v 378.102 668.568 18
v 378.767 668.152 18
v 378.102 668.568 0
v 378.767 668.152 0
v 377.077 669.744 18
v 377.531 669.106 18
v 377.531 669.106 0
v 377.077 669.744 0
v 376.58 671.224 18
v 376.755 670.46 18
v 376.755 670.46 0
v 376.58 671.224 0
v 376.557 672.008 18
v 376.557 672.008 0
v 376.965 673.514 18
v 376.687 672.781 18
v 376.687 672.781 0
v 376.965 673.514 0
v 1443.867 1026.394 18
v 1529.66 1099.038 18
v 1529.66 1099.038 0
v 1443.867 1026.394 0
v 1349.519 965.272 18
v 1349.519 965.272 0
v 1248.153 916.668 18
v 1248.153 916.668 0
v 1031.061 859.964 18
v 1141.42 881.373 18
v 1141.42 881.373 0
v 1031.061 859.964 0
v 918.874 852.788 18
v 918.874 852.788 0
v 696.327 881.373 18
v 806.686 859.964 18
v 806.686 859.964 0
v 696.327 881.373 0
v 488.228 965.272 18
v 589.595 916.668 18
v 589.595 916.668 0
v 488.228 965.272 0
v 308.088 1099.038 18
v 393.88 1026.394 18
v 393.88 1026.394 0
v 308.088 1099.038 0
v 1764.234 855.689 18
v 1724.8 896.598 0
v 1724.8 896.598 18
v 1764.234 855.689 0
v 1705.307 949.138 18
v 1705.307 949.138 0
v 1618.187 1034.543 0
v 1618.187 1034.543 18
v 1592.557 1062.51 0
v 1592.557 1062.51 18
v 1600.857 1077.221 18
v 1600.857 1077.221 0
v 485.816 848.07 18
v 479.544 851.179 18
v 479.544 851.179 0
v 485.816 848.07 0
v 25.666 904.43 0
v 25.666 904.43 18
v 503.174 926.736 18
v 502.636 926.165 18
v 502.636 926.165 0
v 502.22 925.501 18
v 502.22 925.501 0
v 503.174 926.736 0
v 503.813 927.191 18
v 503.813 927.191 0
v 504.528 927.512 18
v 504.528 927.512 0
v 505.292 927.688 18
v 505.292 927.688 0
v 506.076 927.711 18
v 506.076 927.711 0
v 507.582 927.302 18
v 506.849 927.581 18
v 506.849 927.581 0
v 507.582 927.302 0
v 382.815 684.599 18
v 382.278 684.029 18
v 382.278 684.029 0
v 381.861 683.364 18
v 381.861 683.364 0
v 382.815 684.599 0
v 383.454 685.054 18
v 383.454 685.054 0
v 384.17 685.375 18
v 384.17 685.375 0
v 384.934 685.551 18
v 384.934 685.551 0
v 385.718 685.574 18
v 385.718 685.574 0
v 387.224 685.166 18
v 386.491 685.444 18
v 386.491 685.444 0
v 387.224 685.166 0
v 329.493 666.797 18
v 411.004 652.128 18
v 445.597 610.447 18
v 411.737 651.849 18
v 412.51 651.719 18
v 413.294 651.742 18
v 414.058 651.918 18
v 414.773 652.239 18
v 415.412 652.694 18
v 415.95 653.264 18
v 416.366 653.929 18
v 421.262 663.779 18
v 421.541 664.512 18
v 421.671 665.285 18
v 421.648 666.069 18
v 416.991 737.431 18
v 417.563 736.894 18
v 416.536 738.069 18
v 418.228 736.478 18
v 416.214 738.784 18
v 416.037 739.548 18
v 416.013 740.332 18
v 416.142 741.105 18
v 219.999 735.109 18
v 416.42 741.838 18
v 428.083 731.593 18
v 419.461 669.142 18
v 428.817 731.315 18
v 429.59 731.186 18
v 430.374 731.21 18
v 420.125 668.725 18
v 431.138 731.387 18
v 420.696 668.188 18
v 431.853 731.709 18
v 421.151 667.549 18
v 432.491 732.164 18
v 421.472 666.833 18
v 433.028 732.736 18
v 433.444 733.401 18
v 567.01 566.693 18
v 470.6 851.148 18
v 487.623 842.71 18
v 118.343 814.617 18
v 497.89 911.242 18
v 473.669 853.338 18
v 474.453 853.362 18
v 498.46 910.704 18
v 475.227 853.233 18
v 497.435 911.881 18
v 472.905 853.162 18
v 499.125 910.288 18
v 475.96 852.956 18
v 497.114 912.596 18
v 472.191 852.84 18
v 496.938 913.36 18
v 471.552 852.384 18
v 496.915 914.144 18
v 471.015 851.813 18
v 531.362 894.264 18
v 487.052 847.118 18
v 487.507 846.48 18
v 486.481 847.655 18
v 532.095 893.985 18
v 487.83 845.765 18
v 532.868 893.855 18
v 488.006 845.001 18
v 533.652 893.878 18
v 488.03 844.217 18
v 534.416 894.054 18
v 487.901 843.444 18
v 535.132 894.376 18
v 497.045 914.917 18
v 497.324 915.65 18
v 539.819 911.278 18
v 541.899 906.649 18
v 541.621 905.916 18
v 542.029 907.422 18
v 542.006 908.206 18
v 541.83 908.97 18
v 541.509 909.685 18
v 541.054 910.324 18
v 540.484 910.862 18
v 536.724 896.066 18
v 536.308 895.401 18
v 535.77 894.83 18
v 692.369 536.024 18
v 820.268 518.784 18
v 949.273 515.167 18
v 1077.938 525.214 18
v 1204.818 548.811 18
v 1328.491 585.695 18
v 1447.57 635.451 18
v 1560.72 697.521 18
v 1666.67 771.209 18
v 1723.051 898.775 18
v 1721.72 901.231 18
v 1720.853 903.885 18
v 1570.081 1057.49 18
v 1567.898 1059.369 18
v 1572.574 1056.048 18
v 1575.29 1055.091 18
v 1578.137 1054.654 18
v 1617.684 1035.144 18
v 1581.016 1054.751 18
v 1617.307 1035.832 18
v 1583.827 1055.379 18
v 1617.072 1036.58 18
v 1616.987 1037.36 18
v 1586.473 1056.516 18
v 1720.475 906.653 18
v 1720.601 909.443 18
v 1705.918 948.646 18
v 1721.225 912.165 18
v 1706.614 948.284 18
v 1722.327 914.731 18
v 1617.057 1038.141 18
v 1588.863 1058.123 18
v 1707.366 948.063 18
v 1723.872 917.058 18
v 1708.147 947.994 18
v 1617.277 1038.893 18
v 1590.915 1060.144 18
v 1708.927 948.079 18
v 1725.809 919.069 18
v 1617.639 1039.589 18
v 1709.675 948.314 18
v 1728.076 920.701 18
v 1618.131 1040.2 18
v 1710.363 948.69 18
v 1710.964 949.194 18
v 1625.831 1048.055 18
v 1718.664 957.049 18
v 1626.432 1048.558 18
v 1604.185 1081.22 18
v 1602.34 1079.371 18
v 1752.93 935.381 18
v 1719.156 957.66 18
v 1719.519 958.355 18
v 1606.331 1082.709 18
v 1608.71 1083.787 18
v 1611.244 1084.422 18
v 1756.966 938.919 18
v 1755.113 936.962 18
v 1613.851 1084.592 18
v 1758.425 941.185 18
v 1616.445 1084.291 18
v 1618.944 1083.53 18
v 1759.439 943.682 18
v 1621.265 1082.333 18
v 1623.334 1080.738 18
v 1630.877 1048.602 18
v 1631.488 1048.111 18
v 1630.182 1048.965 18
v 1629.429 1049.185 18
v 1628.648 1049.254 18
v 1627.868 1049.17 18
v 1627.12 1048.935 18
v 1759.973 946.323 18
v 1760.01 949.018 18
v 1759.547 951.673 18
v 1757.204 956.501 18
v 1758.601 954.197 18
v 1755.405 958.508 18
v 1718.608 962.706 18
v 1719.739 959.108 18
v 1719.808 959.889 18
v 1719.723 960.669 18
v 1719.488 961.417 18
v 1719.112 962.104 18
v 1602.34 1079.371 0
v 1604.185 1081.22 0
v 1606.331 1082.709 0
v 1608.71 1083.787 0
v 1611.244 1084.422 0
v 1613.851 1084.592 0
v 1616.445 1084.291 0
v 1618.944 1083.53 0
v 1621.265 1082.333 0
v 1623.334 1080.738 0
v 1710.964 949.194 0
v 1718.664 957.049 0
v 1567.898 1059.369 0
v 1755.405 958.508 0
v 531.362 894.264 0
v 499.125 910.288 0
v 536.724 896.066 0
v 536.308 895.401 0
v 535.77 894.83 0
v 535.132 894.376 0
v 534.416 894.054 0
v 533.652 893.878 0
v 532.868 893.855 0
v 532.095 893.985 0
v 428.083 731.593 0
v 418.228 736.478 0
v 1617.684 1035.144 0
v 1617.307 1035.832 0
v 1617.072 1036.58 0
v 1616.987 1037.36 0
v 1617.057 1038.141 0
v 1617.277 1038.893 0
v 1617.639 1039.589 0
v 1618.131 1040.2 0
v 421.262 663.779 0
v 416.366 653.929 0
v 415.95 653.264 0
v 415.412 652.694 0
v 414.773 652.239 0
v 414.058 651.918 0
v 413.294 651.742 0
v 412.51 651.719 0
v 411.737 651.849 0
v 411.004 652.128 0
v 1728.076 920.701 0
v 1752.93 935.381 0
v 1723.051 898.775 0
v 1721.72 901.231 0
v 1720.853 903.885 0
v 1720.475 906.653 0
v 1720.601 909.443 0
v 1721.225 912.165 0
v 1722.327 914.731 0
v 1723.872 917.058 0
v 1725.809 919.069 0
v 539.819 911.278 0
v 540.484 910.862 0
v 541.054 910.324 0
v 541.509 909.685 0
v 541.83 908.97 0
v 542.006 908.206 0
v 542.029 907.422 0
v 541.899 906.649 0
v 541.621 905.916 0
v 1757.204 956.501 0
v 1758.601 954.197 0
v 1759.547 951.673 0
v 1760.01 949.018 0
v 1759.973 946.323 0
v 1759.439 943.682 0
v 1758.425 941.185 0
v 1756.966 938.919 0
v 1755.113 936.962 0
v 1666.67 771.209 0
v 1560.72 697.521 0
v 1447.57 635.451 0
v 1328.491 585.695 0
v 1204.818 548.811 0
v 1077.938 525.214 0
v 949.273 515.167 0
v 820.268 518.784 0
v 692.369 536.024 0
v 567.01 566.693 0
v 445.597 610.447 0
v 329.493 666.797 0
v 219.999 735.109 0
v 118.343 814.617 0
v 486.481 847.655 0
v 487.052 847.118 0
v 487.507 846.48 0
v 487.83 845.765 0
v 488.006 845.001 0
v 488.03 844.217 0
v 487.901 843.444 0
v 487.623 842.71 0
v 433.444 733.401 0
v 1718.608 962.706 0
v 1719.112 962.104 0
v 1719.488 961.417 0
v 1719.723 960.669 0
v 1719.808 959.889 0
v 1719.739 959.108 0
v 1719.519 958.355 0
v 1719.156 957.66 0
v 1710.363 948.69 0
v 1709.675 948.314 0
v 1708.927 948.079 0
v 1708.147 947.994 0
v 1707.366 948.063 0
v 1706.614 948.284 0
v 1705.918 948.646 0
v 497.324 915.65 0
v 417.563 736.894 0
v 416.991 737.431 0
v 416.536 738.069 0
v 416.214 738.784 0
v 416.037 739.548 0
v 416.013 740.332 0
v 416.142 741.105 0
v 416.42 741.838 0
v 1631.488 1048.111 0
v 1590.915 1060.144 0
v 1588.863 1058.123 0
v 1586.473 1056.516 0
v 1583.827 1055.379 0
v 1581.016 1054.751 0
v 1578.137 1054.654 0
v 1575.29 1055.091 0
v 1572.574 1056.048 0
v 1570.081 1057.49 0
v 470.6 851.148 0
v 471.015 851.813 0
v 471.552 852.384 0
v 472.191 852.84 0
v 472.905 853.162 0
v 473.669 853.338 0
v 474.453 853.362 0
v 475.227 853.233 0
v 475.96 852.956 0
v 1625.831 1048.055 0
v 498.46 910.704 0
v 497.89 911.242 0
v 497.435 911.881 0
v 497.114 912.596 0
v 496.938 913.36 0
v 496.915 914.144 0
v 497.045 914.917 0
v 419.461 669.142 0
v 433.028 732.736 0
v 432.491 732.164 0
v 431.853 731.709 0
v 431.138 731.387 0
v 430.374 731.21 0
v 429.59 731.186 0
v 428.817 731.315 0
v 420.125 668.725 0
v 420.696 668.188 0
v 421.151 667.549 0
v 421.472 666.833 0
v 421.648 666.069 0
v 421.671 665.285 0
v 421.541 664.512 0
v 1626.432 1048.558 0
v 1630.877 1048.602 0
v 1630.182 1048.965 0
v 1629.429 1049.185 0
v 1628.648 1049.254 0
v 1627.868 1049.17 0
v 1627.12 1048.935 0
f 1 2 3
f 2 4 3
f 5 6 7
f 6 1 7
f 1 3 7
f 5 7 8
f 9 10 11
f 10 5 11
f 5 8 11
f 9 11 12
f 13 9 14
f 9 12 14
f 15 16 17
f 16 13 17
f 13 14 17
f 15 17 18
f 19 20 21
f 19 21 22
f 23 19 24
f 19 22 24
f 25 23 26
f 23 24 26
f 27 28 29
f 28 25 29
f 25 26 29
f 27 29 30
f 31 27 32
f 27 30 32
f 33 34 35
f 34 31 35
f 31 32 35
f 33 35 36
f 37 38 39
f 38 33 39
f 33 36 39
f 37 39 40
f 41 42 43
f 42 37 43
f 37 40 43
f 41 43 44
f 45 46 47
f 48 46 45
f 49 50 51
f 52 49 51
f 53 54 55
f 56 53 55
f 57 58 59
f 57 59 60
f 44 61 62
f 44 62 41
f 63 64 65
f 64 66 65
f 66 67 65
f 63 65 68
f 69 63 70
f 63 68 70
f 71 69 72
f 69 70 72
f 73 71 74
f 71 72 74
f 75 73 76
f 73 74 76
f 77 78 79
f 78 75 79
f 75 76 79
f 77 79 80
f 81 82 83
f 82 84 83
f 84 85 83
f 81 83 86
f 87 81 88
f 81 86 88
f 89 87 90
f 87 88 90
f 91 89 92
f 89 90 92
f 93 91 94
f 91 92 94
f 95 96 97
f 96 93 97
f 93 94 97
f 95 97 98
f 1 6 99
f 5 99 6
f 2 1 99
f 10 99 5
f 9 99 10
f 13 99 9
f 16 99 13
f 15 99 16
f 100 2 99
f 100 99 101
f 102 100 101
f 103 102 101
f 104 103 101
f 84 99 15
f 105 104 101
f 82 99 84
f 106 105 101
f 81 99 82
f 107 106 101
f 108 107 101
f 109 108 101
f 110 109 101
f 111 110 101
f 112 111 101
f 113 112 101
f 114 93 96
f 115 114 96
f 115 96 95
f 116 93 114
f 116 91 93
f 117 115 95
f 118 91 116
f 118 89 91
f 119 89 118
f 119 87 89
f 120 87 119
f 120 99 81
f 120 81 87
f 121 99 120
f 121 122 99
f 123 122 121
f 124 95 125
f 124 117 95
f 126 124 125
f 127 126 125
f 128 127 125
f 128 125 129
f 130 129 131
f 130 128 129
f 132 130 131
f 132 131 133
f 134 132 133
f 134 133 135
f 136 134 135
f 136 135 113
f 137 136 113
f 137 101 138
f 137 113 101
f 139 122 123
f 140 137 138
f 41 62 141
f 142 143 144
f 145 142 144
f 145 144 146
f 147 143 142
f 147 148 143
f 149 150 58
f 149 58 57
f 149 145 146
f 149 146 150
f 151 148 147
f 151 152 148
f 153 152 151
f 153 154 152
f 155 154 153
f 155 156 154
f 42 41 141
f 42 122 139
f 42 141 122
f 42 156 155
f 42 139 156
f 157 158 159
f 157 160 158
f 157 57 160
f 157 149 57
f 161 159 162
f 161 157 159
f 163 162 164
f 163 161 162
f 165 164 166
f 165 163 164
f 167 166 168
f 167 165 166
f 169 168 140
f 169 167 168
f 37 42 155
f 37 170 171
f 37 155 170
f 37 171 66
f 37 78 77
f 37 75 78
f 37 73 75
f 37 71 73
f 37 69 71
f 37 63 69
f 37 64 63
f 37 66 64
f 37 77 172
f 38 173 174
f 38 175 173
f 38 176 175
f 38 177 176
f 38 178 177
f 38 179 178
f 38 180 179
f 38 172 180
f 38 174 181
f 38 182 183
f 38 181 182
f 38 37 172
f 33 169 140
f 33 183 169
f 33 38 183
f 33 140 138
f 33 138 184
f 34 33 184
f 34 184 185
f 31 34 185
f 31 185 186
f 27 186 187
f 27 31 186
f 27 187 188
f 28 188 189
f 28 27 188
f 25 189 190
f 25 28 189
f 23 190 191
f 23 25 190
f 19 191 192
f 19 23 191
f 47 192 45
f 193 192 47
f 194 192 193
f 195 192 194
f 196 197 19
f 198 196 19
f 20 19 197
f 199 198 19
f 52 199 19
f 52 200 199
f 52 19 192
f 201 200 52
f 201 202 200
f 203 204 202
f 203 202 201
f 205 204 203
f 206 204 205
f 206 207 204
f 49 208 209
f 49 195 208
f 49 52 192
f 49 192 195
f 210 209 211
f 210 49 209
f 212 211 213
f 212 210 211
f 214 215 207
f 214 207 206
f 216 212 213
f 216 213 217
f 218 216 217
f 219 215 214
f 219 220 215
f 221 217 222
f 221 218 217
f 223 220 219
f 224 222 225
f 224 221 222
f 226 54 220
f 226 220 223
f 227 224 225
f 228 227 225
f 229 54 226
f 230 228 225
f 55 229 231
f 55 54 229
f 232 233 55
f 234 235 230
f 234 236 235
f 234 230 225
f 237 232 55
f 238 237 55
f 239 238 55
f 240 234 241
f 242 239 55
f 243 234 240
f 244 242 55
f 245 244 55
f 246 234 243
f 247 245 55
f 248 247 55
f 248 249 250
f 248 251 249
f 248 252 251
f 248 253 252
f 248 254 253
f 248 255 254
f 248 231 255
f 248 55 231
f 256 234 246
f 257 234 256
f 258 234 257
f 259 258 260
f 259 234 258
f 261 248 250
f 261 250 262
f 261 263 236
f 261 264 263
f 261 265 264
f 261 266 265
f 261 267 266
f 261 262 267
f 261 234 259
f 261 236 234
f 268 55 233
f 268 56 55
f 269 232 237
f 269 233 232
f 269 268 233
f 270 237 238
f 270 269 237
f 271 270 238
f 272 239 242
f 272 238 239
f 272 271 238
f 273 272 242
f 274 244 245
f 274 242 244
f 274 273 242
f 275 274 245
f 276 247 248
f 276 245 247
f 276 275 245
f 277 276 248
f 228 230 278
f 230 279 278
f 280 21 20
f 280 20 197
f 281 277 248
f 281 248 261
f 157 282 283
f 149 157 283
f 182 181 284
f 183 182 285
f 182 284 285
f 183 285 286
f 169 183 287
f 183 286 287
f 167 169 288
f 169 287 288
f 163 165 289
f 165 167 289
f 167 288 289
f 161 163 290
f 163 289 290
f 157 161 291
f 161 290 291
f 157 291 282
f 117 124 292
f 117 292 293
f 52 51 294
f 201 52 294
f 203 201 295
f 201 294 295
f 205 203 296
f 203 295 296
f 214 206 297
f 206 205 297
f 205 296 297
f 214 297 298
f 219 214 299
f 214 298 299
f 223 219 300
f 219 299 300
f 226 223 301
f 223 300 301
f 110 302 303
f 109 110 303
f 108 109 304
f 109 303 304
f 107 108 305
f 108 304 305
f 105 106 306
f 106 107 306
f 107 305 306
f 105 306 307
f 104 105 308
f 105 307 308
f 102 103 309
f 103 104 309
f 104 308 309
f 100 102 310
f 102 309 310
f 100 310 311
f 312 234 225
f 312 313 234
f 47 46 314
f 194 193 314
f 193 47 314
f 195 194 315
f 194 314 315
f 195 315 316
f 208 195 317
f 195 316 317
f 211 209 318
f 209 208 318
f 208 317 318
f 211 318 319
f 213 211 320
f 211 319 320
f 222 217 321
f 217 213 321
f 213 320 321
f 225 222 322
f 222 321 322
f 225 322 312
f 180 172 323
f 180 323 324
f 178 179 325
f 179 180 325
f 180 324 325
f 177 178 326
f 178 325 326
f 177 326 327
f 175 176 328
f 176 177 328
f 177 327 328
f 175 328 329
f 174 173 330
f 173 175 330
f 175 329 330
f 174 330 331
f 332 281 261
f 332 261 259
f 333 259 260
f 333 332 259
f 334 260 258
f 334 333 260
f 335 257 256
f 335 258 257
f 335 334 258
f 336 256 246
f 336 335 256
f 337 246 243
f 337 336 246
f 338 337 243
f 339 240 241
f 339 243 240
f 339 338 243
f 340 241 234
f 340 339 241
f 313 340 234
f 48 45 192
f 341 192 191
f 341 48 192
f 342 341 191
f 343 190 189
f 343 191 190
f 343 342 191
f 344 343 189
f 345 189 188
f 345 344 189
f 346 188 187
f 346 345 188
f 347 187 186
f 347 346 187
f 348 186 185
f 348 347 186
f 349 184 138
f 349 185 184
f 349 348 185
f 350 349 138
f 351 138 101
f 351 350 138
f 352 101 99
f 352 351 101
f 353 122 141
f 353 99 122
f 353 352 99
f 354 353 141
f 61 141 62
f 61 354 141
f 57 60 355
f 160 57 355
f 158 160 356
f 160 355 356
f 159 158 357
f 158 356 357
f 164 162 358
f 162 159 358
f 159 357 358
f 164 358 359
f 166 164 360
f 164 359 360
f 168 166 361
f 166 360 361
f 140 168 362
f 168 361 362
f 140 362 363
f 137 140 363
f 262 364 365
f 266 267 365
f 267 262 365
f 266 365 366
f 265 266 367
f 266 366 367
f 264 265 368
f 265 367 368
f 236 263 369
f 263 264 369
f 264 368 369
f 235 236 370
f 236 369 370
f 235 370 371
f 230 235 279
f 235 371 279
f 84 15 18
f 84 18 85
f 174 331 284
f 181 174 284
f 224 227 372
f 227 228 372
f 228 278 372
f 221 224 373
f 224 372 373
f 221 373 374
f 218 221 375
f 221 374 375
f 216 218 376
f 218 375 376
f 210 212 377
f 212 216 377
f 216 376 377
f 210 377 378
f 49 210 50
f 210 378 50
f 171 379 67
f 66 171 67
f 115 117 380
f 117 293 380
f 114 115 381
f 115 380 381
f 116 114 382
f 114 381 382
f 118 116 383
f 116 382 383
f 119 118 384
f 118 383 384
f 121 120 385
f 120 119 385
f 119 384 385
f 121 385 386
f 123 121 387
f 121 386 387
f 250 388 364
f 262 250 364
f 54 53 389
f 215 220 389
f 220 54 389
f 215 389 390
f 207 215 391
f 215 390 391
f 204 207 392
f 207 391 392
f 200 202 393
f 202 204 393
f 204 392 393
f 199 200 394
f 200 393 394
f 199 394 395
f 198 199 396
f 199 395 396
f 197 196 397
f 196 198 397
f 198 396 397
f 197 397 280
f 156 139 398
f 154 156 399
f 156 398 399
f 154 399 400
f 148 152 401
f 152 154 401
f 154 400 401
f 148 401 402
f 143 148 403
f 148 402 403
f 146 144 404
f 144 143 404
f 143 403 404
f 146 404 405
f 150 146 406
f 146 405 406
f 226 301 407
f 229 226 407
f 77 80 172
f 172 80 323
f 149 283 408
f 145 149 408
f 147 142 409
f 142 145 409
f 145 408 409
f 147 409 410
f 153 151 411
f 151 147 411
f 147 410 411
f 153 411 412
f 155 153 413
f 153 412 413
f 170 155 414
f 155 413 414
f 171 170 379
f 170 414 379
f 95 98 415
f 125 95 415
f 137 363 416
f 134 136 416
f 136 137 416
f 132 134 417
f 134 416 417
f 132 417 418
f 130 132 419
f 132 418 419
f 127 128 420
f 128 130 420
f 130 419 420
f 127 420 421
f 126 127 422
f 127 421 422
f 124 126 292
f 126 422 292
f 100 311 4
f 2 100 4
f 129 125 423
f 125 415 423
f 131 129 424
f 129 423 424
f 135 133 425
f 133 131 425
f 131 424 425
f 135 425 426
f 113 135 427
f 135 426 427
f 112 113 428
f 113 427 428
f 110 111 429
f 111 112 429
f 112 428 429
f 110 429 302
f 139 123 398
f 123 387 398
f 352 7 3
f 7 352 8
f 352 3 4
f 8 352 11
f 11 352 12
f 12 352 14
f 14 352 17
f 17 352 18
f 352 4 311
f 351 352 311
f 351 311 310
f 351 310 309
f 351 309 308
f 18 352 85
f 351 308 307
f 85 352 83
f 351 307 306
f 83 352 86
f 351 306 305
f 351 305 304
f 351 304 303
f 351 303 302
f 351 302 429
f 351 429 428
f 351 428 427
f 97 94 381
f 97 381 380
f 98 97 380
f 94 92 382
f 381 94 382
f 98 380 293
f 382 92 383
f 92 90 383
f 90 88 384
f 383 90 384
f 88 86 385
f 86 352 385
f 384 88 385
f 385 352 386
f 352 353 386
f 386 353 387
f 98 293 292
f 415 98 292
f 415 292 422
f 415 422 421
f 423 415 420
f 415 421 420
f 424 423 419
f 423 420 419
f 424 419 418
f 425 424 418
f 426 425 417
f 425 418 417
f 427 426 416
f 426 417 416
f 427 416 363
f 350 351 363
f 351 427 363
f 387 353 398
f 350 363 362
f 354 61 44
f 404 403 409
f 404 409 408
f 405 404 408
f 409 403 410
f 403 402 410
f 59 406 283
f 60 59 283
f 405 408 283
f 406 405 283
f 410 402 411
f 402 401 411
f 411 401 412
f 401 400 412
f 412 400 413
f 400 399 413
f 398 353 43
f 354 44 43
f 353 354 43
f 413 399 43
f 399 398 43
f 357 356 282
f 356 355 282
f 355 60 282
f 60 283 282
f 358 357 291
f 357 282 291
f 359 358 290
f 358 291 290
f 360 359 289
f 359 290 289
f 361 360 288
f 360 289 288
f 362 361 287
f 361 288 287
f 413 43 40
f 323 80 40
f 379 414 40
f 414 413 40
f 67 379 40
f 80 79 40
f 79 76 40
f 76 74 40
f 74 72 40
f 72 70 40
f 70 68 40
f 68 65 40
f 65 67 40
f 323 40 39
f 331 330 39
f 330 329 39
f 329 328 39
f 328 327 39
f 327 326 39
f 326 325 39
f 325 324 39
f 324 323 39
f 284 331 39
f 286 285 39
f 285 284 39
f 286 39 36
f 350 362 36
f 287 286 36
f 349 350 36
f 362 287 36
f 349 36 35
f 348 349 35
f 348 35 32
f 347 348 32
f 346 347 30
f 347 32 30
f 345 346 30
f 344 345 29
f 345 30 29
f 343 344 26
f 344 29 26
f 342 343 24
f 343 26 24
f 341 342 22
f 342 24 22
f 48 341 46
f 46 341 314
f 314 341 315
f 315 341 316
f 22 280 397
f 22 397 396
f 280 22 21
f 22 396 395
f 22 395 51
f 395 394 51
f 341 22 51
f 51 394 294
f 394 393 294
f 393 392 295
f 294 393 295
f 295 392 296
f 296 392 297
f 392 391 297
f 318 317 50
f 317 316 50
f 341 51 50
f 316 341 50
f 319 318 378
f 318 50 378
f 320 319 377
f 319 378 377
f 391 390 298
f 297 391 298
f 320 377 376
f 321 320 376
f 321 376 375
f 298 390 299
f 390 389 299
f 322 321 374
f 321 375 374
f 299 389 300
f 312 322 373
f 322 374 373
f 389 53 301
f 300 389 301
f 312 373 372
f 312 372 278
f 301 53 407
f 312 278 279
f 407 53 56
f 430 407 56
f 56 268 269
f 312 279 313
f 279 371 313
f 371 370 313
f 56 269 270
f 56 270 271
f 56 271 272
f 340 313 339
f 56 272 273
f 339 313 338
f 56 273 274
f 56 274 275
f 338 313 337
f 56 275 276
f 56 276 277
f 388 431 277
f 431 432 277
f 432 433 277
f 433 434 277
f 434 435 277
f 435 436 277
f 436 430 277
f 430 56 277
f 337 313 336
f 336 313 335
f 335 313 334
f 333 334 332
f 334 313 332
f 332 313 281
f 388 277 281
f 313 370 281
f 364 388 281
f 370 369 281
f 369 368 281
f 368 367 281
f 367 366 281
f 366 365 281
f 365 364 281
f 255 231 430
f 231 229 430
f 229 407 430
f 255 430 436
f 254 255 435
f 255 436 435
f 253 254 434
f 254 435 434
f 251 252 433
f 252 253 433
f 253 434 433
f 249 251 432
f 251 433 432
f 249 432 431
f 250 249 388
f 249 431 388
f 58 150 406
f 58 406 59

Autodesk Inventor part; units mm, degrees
ref_plane "YZ Plane" through (0, 0, 0) normal (1, 0, 0) x (0, 1, 0)
ref_plane "XZ Plane" through (0, 0, 0) normal (0, 1, 0) x (-1, 0, 0)
ref_plane "XY Plane" through (0, 0, 0) normal (0, 0, 1) x (1, 0, 0)
sketch "CONTOURS" plane through (0, 0, 0) normal (0, 0, 1) x (1, 0, 0)
  arc A0 (1567.8979, 1059.3694) -> (1592.5572, 1062.5103) centre (1579.0574, 1070.1265) ccw
  line L0 (1592.5572, 1062.5103) -> (1600.8567, 1077.2212)
  arc A1 (1623.3344, 1080.7382) -> (1600.8567, 1077.2212) centre (1613.4855, 1070.0964) ccw
  line L1 (1623.3344, 1080.7382) -> (1755.4047, 958.5078)
  arc A2 (1752.9302, 935.3813) -> (1755.4047, 958.5078) centre (1745.5558, 947.866) ccw
  line L2 (1752.9302, 935.3813) -> (1728.0763, 920.7006)
  arc A3 (1728.0763, 920.7006) -> (1724.7998, 896.5978) centre (1735.9593, 907.3549) ccw
  line L3 (1724.7998, 896.5978) -> (1764.2337, 855.6886)
  arc A4 (25.6661, 904.4304) -> (1764.2337, 855.6886) centre (918.8737, 1733.3946) ccw
  line L4 (25.6661, 904.4304) -> (308.0876, 1099.0382)
  arc A5 (308.0876, 1099.0382) -> (1529.6596, 1099.0382) centre (918.8736, 1733.3944) ccw
  line L5 (1529.6596, 1099.0382) -> (1567.8979, 1059.3694)
  dimension "d1" = 1218.6064
  dimension "d3" = 880.6062
sketch "HOLES" plane through (0, 0, 0) normal (0, 0, 1) x (1, 0, 0)
  line L0 (376.9652, 673.5139) -> (381.8614, 683.3642)
  arc A0 (387.2238, 685.1656) -> (381.8614, 683.3642) centre (385.4433, 681.5837) ccw
  line L1 (387.2238, 685.1656) -> (419.4609, 669.1416)
  arc A1 (421.2623, 663.7792) -> (419.4609, 669.1416) centre (417.6804, 665.5597) ccw
  arc A2 (1631.4879, 1048.1109) -> (1625.8313, 1048.0547) centre (1628.6877, 1045.2545) ccw
  line L2 (1718.6644, 957.049) -> (1710.9639, 949.1939)
  arc A3 (1705.3073, 949.1377) -> (1710.9639, 949.1939) centre (1708.1075, 951.9941) ccw
  line L3 (1705.3073, 949.1377) -> (1618.1871, 1034.543)
  arc A4 (1618.1309, 1040.1996) -> (1618.1871, 1034.543) centre (1620.9873, 1037.3994) ccw
  line L4 (1618.1309, 1040.1996) -> (1625.8313, 1048.0547)
  line L5 (1631.4879, 1048.1109) -> (1718.6081, 962.7056)
  arc A5 (1718.6644, 957.049) -> (1718.6081, 962.7056) centre (1715.808, 959.8492) ccw
  line L6 (497.3235, 915.6504) -> (502.2197, 925.5006)
  arc A6 (507.5821, 927.3021) -> (502.2197, 925.5006) centre (505.8016, 923.7202) ccw
  line L7 (507.5821, 927.3021) -> (539.8192, 911.2781)
  arc A7 (541.6206, 905.9157) -> (539.8192, 911.2781) centre (538.0387, 907.6962) ccw
  line L8 (416.4201, 741.8384) -> (470.5996, 851.148)
  arc A8 (531.362, 894.264) -> (536.7244, 896.0655) centre (533.1425, 897.8459) ccw
  line L9 (531.362, 894.264) -> (499.1249, 910.2881)
  arc A9 (497.3235, 915.6504) -> (499.1249, 910.2881) centre (500.9054, 913.87) ccw
  line L10 (479.5438, 851.1791) -> (485.8157, 848.0705)
  arc A10 (487.6232, 842.7102) -> (485.8157, 848.0705) centre (484.0393, 844.4865) ccw
  line L11 (487.6232, 842.7102) -> (433.4437, 733.4006)
  arc A11 (428.0834, 731.5931) -> (433.4437, 733.4006) centre (429.8598, 735.177) ccw
  line L12 (428.0834, 731.5931) -> (418.2276, 736.4781)
  arc A12 (416.4201, 741.8384) -> (418.2276, 736.4781) centre (420.004, 740.062) ccw
  line L13 (541.6206, 905.9157) -> (536.7244, 896.0655)
  arc A13 (475.9599, 852.9555) -> (470.5996, 851.148) centre (474.1835, 849.3716) ccw
  line L14 (475.9599, 852.9555) -> (479.5438, 851.1791)
  line L15 (421.2623, 663.7792) -> (416.3661, 653.929)
  arc A14 (411.0038, 652.1276) -> (416.3661, 653.929) centre (412.7842, 655.7095) ccw
  line L16 (411.0038, 652.1276) -> (378.7667, 668.1516)
  arc A15 (376.9652, 673.5139) -> (378.7667, 668.1516) centre (380.5471, 671.7335) ccw
  dimension "d5" = 0.065
  dimension "d7" = 0.065
sketch "LETTERS" plane through (0, 0, 0) normal (0, 0, 1) x (1, 0, 0)
  line L0 (544.6299, 751.705) -> (554.564, 747.8187)
  line L1 (561.8694, 755.3769) -> (548.1913, 760.7277)
  line L2 (548.1913, 760.7277) -> (540.975, 742.2812)
  line L3 (540.975, 742.2812) -> (554.6531, 736.9303)
extrude "Extrusion3" add sketch "CONTOURS" along normal blind 18
extrude "Extrusion4" cut sketch "HOLES" along normal blind 18
properties part number "Platform E1" material "Wood (Birch)"
